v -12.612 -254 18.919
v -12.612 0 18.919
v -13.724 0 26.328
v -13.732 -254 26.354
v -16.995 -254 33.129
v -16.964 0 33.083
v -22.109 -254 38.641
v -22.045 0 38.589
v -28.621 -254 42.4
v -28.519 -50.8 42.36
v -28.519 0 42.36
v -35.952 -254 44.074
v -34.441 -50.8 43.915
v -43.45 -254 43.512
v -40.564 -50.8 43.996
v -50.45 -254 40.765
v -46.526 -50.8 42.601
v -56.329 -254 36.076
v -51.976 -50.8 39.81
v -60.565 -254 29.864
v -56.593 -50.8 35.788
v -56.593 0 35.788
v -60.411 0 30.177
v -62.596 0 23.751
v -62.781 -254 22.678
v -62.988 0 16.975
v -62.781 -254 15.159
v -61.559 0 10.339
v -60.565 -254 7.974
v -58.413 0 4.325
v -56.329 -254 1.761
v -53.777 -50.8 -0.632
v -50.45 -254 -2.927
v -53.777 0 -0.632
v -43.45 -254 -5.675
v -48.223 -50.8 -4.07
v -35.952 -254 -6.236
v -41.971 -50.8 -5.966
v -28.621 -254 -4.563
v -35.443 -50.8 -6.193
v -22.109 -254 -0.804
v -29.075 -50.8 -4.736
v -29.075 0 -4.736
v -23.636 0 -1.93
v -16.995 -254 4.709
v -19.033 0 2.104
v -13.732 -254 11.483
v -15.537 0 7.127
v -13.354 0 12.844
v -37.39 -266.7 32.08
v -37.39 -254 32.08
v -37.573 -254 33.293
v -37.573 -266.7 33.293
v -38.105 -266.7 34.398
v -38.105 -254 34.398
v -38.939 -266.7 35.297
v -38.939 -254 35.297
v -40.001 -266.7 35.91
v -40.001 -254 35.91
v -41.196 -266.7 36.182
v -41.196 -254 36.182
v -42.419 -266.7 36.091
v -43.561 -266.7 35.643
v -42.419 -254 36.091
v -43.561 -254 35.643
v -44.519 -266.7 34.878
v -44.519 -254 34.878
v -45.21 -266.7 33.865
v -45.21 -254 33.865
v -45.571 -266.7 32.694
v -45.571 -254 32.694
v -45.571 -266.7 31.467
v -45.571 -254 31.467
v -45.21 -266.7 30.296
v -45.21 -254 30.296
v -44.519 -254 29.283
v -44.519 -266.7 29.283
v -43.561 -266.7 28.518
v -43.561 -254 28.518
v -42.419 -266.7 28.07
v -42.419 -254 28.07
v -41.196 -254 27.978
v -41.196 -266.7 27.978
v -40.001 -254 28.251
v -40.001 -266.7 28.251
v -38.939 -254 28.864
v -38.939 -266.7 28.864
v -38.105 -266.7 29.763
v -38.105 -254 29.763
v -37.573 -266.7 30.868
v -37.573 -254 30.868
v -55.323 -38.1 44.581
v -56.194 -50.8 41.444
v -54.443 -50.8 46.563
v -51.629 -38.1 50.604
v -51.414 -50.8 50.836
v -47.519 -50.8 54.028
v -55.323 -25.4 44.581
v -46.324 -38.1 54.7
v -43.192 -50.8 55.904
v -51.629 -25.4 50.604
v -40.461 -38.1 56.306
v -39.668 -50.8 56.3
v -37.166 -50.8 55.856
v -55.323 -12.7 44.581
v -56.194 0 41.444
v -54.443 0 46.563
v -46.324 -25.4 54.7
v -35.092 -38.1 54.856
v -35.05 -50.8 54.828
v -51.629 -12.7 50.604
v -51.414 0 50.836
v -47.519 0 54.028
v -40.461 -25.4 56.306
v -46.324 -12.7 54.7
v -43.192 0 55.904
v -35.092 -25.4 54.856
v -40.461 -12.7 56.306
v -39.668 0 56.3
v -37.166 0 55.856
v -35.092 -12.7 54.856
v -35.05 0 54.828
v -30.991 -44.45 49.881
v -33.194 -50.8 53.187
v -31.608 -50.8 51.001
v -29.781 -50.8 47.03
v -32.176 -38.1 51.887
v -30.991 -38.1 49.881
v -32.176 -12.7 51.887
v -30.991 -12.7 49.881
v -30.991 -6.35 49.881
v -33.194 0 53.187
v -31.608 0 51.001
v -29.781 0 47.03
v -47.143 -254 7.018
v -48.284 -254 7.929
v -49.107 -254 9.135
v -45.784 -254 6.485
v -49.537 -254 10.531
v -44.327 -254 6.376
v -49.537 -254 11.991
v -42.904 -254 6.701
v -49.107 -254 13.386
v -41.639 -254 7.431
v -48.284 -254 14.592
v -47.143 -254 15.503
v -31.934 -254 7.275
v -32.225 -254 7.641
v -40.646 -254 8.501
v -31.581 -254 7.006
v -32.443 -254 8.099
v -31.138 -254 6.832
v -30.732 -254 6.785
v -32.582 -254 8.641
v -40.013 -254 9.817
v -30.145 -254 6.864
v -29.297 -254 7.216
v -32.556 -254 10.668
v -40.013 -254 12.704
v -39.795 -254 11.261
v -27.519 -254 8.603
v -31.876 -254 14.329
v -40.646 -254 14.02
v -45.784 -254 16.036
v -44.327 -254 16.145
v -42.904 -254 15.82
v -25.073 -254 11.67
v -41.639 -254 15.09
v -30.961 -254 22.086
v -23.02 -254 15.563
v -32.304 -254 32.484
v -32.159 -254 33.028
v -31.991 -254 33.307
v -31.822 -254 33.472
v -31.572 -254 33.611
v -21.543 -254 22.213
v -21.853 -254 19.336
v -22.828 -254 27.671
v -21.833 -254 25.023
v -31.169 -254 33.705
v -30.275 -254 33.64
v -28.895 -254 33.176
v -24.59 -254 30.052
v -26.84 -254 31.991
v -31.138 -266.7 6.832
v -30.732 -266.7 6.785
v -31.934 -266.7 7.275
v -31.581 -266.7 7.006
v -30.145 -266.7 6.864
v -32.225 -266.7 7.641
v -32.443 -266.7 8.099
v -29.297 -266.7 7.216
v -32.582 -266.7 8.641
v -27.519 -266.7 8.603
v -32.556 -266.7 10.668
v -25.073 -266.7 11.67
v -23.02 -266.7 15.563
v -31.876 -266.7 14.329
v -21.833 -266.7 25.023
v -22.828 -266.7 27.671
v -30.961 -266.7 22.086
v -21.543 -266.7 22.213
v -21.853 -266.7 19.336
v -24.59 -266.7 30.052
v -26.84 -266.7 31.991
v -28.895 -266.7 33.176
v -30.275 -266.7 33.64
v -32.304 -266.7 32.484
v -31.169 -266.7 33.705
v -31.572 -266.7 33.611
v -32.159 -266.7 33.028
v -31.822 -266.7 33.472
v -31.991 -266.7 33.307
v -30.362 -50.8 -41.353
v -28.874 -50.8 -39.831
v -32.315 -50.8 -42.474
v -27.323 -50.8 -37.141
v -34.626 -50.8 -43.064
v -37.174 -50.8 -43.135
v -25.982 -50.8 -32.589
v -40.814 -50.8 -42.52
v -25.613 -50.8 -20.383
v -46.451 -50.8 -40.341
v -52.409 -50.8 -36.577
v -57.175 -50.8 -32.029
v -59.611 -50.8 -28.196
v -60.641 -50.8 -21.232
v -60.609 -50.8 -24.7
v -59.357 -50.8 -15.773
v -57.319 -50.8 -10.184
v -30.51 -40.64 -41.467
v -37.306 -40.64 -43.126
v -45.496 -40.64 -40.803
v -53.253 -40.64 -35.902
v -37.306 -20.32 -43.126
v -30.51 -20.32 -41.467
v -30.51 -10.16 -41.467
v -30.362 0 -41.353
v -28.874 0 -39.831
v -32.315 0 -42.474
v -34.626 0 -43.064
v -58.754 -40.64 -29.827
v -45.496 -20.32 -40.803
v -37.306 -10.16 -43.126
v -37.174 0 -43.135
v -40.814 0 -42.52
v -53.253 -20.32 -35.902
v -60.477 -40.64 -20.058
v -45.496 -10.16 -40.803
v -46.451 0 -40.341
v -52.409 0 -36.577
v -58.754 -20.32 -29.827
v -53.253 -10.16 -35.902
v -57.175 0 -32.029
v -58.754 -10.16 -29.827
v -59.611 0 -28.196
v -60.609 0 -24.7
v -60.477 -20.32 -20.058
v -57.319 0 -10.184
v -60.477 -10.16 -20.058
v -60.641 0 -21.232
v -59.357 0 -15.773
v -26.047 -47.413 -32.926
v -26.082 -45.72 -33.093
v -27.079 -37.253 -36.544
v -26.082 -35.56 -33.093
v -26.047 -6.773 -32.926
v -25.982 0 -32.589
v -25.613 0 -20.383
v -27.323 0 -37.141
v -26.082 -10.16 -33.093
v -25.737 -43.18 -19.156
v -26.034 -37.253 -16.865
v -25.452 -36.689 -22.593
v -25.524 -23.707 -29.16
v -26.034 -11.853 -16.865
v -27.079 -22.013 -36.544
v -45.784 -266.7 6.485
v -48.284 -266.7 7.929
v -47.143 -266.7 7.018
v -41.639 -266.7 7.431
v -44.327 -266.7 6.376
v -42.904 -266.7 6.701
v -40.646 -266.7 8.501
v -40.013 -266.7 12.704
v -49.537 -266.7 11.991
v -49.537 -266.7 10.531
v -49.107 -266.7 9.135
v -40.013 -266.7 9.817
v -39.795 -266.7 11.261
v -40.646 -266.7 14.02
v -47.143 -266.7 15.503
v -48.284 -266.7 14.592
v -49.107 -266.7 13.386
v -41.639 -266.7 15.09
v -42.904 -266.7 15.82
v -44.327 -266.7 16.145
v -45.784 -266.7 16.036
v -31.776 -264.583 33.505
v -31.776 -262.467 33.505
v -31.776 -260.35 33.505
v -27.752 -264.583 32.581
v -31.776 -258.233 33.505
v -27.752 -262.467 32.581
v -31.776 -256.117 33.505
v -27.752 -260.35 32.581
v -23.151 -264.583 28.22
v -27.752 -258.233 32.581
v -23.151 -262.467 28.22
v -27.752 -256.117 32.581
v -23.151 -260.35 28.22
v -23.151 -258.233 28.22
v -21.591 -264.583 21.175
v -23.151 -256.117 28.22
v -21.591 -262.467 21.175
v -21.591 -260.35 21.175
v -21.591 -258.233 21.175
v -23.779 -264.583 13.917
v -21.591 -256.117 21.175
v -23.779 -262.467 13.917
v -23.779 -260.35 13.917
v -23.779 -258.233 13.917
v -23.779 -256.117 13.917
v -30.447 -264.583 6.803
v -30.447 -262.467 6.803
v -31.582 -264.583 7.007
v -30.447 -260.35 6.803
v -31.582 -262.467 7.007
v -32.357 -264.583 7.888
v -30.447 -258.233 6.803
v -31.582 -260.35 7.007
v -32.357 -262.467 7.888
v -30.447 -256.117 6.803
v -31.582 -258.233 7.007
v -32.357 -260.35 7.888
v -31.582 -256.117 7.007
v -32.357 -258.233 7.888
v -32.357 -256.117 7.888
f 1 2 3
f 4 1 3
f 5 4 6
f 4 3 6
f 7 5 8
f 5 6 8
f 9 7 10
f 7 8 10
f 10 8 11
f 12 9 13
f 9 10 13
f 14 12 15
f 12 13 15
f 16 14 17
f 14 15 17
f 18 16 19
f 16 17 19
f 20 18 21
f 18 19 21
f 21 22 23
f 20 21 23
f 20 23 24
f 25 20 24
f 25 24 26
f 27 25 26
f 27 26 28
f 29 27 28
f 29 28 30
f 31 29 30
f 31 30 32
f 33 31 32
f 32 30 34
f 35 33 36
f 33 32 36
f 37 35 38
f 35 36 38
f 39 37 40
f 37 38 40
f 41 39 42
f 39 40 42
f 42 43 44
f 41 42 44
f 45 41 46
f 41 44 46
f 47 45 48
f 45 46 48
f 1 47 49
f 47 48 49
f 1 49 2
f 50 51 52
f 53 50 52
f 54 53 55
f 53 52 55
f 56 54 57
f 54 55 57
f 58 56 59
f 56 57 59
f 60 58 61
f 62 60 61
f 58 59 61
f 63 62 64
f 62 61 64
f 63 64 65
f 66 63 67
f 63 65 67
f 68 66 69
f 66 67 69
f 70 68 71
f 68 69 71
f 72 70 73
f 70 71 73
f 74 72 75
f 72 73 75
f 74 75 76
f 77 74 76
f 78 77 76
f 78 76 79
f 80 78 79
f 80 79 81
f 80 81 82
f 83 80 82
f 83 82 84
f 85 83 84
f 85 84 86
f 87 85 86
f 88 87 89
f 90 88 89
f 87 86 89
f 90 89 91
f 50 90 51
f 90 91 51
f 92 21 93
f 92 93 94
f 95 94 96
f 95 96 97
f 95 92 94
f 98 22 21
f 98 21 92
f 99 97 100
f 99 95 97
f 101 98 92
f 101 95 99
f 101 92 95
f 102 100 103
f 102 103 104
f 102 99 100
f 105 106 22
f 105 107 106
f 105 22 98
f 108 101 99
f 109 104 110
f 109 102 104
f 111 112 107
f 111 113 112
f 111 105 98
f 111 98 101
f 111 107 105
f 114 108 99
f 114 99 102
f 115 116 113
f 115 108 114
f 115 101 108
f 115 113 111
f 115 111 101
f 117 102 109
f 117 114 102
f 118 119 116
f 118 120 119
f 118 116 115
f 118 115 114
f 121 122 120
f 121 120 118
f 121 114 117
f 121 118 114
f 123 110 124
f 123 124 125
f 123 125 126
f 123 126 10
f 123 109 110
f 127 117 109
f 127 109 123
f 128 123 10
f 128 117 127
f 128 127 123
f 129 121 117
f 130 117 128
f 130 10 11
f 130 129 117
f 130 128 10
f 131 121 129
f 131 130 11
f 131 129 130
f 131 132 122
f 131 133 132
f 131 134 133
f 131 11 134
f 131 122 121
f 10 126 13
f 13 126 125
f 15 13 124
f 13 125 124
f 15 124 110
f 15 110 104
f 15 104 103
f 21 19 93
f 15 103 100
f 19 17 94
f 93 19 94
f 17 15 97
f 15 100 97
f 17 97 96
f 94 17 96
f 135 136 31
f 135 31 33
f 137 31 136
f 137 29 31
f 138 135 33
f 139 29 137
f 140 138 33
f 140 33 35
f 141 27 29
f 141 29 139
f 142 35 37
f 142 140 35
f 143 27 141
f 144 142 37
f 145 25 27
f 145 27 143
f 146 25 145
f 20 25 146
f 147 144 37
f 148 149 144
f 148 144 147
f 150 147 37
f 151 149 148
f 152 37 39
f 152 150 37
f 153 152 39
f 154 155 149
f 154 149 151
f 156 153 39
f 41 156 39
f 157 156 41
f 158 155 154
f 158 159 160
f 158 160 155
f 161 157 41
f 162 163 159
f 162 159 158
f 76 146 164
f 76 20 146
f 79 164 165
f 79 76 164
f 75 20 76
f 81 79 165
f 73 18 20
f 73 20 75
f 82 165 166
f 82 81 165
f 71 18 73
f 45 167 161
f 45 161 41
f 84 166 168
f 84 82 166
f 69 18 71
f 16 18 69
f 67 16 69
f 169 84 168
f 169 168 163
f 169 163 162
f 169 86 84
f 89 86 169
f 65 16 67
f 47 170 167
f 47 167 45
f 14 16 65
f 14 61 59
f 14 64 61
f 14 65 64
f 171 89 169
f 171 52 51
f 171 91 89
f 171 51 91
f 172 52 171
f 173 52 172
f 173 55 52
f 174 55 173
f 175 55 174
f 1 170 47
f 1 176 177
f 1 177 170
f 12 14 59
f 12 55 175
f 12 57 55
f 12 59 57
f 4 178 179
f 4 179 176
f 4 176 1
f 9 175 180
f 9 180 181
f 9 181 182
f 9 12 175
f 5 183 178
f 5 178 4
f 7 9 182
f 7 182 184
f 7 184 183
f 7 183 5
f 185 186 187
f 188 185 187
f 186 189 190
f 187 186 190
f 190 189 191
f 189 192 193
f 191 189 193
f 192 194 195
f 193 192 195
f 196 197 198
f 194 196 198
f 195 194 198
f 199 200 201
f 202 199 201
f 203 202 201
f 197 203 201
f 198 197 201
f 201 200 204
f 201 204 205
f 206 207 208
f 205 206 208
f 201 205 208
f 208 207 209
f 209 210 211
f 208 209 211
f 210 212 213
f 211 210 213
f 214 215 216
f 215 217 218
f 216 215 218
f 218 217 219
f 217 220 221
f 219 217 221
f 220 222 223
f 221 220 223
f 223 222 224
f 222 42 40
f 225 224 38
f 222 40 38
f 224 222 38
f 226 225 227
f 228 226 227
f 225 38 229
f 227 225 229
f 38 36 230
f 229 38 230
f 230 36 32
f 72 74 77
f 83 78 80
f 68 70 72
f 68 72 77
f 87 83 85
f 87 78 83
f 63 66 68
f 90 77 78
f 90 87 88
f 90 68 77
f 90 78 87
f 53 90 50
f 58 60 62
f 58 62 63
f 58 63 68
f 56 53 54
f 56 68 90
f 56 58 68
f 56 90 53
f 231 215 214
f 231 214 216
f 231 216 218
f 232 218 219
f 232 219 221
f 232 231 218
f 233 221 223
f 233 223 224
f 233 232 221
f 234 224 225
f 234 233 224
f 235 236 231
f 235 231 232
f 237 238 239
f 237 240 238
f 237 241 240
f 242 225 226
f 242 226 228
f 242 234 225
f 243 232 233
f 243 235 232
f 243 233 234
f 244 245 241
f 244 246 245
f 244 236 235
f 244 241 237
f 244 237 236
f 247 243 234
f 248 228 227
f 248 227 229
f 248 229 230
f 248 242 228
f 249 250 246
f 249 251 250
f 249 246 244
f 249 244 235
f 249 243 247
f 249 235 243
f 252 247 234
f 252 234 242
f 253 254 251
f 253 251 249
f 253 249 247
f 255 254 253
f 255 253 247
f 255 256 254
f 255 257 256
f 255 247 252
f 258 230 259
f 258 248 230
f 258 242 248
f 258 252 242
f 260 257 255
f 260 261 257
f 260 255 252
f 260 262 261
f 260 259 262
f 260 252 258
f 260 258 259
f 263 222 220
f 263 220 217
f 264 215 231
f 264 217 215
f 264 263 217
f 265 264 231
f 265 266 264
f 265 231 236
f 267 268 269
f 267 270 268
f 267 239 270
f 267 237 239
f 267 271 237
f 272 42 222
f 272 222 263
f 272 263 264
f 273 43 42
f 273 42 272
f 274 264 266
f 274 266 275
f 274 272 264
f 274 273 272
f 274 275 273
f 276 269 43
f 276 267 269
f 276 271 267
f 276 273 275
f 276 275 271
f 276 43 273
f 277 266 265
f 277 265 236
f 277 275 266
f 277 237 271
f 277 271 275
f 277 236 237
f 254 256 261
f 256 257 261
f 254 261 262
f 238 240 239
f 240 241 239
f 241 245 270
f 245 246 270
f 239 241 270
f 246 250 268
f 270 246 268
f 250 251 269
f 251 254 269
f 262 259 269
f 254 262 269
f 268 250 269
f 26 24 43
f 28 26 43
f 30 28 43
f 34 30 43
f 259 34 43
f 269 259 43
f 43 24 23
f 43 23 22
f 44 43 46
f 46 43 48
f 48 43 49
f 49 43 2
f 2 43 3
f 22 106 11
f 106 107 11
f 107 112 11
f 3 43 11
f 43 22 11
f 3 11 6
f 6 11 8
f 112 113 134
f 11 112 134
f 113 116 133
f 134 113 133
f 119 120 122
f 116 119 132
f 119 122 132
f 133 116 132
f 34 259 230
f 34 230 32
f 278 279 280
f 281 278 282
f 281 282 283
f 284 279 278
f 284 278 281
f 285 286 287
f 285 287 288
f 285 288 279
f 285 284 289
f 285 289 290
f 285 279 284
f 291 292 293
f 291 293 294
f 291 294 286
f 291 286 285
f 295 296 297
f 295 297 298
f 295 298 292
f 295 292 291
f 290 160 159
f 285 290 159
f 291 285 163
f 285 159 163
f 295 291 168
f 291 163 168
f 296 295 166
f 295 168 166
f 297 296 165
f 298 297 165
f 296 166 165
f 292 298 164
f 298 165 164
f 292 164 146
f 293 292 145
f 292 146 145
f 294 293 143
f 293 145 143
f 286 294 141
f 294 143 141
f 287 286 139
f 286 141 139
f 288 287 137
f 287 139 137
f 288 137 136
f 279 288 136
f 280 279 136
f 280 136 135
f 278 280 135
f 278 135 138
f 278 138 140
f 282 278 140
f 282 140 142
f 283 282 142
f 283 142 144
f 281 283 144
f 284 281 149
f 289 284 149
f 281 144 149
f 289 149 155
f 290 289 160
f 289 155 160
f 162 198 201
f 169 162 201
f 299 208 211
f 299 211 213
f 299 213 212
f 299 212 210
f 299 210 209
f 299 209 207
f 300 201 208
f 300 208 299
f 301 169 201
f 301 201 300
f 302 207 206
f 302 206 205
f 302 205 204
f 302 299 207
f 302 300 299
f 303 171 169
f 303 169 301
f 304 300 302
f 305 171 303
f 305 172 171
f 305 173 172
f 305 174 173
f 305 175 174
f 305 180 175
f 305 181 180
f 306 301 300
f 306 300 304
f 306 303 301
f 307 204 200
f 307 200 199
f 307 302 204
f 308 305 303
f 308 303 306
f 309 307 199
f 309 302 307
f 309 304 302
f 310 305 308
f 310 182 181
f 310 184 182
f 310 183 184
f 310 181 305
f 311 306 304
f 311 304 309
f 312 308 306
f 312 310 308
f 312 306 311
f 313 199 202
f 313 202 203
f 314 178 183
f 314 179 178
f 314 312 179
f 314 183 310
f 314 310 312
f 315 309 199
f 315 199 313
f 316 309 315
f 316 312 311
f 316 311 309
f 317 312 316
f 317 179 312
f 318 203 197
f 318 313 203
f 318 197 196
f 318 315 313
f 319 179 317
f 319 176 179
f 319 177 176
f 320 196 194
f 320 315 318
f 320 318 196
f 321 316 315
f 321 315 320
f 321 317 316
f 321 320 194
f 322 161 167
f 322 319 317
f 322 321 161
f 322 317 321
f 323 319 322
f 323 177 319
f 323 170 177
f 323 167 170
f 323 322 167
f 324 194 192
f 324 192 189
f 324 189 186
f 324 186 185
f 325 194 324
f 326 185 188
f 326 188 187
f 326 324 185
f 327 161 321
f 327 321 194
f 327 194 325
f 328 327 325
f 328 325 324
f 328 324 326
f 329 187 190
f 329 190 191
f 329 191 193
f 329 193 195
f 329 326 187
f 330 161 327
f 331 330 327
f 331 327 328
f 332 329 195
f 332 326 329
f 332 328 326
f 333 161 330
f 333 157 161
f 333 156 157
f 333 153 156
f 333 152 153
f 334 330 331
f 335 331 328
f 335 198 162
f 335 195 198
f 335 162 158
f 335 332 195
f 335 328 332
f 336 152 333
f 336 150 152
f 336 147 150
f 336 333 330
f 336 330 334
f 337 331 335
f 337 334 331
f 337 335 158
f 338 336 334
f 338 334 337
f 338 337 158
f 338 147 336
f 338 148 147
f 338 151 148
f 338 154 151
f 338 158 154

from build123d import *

# Parameters (mm, degrees)
F0_R     = 25.2255961417
F1_DEPTH = 254
F2_R     = 4.8984695606
F2_R_2   = 4.1135395879
F3_DEPTH = 12.7
F5_DEPTH = 50.8


with BuildPart() as f1:
    # F0 (on Front) → F1 (new body)
    with BuildSketch(Plane.XZ):
        with Locations((-37.837240845, 18.9186204225)):
            Circle(F0_R)
    extrude(amount=F1_DEPTH)

    # F2 (on face) → F3 (join)
    with BuildSketch(Plane.XZ.offset(254)):
        with Locations((-44.693492353, 11.2606054172)):
            Circle(F2_R)
        with Locations((-41.5038913488, 32.080437988)):
            Circle(F2_R_2)
        with BuildLine():
            add(Edge.make_bspline(
                [(-30.9607814997, 22.0860820264), (-31.1174790444, 27.1779190493), (-35.4705043818, 37.384895038), (-19.6123896035, 28.581671559), (-22.3060000408, 13.9240447836), (-29.9356971904, 5.434185596), (-34.1455406145, 8.7707728586), (-30.7894579728, 16.5189783491), (-30.9607814997, 22.0860820264)],
                knots=[0, 0, 0, 0, 0.179844359, 0.3488990719, 0.5500177158, 0.7159973757, 0.8033691597, 1, 1, 1, 1], degree=3))
        make_face()
    extrude(amount=F3_DEPTH)

    # F4 (on Front) → F5 (join)
    with BuildSketch(Plane.XZ):
        with BuildLine():
            add(Edge.make_bspline(
                [(-45.1222844422, 12.1712666005), (-52.9735846355, 16.9556340719), (-64.7701771693, 46.9993806394), (-27.9966636305, 66.0454754857), (-24.6817713236, 14.3898842389), (-39.8118103434, 8.9352090163), (-45.1222844422, 12.1712666005)],
                knots=[0, 0, 0, 0, 0.2823086577, 0.513014559, 0.8090516503, 1, 1, 1, 1], degree=3))
        make_face()
        with BuildLine():
            add(Edge.make_bspline(
                [(-57.3190748692, -10.1838894188), (-54.8526705143, -3.4441726715), (-51.1531019459, 10.2525243726), (-27.5972764056, 9.3930479254), (-18.4794160333, -57.7544605135), (-66.5035831823, -30.9630818541), (-59.7978178724, -16.957322858), (-57.3190748692, -10.1838894188)],
                knots=[0, 0, 0, 0, 0.1765612044, 0.3326258233, 0.6015627152, 0.8225555152, 1, 1, 1, 1], degree=3))
        make_face()
    extrude(amount=F5_DEPTH)


solid = f1.part
